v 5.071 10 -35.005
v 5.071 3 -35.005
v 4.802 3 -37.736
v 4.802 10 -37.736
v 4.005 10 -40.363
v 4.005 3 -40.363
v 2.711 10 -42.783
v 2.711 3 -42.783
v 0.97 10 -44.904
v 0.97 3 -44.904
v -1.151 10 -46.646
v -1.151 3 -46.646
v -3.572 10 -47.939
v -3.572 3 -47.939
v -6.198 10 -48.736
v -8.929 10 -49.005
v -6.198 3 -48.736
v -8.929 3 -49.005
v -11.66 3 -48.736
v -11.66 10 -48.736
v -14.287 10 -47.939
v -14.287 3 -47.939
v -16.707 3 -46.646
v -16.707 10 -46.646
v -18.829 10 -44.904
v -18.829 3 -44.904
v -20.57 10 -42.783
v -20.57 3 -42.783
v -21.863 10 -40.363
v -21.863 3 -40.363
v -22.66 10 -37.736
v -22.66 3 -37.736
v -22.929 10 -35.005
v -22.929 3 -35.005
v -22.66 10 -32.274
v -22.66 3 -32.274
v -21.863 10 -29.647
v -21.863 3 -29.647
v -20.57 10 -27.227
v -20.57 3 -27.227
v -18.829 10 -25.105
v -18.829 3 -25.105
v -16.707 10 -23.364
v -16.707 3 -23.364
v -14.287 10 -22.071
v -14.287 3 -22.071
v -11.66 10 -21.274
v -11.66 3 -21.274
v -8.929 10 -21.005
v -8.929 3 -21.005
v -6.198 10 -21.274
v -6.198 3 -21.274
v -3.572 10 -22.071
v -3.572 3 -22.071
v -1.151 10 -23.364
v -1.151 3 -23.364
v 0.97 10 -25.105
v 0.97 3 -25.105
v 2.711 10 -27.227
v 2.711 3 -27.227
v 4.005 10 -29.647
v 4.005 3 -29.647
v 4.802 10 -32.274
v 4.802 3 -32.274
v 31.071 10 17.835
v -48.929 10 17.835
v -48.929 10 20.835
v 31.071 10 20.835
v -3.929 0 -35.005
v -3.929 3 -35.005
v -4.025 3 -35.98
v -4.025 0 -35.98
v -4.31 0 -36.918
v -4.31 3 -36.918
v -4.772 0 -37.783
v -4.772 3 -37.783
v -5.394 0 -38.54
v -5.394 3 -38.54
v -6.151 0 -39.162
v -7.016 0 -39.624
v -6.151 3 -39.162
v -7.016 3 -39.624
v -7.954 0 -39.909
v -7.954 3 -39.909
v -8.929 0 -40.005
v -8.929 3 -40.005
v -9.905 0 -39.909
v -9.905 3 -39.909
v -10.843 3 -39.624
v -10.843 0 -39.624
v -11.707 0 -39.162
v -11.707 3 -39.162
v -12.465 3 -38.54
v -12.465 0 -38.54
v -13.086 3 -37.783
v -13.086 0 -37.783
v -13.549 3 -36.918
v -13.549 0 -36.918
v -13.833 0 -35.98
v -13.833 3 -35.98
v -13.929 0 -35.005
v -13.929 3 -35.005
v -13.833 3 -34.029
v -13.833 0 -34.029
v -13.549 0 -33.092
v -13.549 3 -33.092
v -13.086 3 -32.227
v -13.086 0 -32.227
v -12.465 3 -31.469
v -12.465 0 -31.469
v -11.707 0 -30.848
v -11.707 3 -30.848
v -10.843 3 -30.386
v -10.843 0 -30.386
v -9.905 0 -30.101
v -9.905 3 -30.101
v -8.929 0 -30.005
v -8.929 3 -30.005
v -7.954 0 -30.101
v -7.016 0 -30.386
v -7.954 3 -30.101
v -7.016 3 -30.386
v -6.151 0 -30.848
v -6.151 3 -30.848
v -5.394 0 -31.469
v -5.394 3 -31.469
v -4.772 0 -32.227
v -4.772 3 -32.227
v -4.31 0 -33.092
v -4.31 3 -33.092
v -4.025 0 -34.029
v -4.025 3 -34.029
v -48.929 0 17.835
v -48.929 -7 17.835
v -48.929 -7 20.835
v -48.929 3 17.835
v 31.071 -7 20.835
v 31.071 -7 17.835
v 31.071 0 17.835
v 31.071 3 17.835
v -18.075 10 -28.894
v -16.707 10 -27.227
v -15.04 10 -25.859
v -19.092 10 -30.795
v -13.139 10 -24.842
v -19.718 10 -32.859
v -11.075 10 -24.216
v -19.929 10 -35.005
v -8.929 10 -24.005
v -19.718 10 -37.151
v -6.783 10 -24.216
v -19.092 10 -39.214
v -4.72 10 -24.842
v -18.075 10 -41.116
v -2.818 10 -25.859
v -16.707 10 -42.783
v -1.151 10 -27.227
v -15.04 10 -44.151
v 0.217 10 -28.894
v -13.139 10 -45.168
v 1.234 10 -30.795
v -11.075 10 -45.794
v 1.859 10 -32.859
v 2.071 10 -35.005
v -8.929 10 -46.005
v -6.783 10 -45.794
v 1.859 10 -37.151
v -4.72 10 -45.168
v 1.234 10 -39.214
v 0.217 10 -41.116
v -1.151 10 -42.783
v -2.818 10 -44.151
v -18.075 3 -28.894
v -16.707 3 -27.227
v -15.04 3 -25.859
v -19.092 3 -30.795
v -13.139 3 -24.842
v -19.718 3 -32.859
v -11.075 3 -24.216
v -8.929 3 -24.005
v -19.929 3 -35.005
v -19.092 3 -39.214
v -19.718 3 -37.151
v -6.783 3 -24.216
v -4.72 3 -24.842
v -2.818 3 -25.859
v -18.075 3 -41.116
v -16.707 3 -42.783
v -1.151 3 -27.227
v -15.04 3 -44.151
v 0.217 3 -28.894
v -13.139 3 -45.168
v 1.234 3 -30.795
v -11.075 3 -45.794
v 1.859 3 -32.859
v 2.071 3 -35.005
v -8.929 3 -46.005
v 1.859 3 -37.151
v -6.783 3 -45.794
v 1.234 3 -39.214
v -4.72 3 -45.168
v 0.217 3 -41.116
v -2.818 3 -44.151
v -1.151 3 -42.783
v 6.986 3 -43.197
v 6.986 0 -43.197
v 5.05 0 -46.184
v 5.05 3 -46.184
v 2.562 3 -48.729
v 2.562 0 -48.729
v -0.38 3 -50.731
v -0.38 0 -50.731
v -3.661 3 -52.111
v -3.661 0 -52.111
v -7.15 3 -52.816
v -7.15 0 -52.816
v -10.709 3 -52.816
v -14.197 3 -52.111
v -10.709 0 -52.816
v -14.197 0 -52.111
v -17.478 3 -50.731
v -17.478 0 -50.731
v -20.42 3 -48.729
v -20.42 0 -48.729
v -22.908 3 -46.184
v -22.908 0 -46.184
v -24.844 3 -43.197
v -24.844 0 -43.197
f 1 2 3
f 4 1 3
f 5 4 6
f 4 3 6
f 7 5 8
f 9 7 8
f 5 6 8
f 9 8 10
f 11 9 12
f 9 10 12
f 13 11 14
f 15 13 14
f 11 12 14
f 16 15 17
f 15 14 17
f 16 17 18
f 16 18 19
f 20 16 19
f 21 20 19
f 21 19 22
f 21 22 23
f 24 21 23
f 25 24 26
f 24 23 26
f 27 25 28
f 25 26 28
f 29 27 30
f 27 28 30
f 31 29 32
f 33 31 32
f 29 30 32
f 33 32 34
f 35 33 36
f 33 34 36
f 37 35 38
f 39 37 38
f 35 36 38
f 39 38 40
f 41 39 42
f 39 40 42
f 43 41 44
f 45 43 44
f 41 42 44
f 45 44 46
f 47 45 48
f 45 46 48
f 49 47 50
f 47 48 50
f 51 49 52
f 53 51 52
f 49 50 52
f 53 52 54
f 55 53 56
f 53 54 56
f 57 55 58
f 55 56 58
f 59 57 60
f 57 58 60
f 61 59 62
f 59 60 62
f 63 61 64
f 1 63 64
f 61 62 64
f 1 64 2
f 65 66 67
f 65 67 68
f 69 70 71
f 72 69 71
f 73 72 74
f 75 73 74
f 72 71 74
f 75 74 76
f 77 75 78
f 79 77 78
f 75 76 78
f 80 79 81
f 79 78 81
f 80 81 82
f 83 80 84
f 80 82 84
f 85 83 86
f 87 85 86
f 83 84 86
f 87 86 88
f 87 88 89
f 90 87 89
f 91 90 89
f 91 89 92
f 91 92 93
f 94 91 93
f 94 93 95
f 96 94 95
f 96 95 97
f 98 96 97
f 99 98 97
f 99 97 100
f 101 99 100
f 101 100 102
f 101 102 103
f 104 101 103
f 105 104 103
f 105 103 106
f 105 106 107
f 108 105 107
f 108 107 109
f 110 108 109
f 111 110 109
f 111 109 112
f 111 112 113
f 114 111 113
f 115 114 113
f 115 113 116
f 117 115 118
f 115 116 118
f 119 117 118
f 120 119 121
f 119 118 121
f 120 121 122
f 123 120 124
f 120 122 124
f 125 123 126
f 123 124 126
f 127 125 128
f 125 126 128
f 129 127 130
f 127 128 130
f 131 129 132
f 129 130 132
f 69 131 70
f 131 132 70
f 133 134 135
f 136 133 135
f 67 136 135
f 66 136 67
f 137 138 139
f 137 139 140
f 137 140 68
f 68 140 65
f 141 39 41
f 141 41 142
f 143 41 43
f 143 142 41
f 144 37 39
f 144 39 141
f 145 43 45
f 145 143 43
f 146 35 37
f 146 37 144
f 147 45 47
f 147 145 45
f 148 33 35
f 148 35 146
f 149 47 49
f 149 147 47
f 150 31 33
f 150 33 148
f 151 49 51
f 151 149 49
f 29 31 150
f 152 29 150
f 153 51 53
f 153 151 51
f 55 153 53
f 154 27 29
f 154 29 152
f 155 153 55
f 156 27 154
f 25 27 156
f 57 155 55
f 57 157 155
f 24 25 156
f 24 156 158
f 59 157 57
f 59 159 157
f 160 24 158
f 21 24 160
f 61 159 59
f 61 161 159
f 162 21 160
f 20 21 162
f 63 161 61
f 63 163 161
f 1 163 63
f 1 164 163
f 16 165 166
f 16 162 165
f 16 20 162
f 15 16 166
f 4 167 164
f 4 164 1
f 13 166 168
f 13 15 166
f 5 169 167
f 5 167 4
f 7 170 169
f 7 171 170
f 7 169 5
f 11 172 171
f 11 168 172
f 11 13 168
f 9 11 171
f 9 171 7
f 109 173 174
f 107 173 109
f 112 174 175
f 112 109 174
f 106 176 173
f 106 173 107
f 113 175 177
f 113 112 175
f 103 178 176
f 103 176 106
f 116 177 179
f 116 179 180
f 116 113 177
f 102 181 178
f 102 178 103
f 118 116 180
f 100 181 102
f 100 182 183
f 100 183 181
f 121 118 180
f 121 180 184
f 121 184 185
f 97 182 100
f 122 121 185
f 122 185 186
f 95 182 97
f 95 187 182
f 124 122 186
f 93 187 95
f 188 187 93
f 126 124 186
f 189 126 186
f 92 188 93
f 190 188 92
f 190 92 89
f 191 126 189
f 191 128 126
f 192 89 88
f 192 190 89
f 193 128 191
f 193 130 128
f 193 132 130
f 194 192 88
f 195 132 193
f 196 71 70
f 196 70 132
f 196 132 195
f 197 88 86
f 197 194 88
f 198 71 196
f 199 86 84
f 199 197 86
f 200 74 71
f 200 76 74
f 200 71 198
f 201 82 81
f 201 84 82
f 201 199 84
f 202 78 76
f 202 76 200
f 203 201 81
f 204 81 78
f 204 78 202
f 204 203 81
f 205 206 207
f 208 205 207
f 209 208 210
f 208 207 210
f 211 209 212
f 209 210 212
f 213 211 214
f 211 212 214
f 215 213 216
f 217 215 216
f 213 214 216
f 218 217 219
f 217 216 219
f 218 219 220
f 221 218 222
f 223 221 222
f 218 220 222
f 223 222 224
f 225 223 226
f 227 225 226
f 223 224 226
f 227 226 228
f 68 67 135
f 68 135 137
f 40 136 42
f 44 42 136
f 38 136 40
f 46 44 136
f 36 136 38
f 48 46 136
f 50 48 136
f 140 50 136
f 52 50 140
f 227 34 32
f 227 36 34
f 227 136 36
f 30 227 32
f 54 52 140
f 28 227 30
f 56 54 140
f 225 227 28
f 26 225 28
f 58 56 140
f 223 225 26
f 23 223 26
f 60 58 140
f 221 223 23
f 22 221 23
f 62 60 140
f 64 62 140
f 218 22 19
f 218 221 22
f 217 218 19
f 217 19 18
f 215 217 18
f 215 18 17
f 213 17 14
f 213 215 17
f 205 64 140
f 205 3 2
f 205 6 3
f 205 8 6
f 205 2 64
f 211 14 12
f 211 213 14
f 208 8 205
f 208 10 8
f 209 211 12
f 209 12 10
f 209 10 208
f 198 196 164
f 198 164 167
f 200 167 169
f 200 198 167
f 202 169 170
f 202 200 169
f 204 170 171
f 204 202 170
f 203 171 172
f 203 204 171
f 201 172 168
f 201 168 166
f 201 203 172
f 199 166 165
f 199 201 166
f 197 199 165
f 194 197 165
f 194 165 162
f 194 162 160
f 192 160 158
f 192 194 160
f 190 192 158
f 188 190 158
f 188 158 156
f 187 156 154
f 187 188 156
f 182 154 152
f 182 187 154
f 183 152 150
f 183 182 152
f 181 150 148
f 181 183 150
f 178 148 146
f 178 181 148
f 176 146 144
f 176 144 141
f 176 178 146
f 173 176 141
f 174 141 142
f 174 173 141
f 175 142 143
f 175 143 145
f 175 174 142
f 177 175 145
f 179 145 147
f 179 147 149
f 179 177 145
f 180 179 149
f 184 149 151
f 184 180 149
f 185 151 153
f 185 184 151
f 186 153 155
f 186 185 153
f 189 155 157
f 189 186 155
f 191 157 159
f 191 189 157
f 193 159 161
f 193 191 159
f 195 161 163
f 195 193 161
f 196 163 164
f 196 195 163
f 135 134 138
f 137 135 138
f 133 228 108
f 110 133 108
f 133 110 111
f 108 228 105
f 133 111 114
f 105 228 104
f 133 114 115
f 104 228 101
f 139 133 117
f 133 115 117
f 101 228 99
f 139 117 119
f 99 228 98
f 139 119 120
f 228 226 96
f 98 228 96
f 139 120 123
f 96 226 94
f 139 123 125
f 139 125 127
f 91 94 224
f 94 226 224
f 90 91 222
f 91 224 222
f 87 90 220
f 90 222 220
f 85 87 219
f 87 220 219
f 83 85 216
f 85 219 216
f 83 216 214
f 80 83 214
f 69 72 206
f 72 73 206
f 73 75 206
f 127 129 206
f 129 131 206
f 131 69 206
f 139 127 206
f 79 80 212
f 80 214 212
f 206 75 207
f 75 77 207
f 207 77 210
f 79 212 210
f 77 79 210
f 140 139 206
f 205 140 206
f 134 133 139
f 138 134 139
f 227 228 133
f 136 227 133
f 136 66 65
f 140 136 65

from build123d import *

# Parameters (mm, degrees)
BOSS_EXTRUDE1_DEPTH = 3
SKETCH2_R           = 14
SKETCH2_R_2         = 11
BOSS_EXTRUDE2_DEPTH = 7
SKETCH3_W           = 80
SKETCH3_H           = 17
BOSS_EXTRUDE3_DEPTH = 3
SKETCH5_R           = 5
CUT_EXTRUDE1_DEPTH  = 10


with BuildPart() as part:
    # Sketch1 → Boss-Extrude1 (new body)
    with BuildSketch(Plane(origin=(0, 0, 0), x_dir=(1, 0, 0), z_dir=(0, 1, 0))):
        with BuildLine():
            Line((-48.929144451, -17.835062273), (31.070855549, -17.835062273))
            Line((31.070855549, -17.835062273), (6.985518971, 43.196988966))
            ThreePointArc((6.985518971, 43.196988966), (-8.929144451, 52.904273338), (-24.843807874, 43.196988966))
            Line((-24.843807874, 43.196988966), (-48.929144451, -17.835062273))
        make_face()
    extrude(amount=BOSS_EXTRUDE1_DEPTH)

    # Sketch2 → Boss-Extrude2 (add)
    with BuildSketch(Plane(origin=(0, 3, 0), x_dir=(1, 0, 0), z_dir=(0, 1, 0))):
        with Locations((-8.929144451, 35.004937727)):
            Circle(SKETCH2_R)
        with Locations((-8.929144451, 35.004937727)):
            Circle(SKETCH2_R_2, mode=Mode.SUBTRACT)
    extrude(amount=BOSS_EXTRUDE2_DEPTH)

    # Sketch3 → Boss-Extrude3 (add)
    with BuildSketch(Plane.XY.offset(17.835062273)):
        with Locations((-8.929144451, 1.5)):
            Rectangle(SKETCH3_W, SKETCH3_H)
    extrude(amount=BOSS_EXTRUDE3_DEPTH)

    # Sketch5 → Cut-Extrude1 (cut)
    with BuildSketch(Plane(origin=(0, 3, 0), x_dir=(1, 0, 0), z_dir=(0, 1, 0))):
        with Locations((-8.929144451, 35.004937727)):
            Circle(SKETCH5_R)
    extrude(amount=-CUT_EXTRUDE1_DEPTH, mode=Mode.SUBTRACT)


solid = part.part
